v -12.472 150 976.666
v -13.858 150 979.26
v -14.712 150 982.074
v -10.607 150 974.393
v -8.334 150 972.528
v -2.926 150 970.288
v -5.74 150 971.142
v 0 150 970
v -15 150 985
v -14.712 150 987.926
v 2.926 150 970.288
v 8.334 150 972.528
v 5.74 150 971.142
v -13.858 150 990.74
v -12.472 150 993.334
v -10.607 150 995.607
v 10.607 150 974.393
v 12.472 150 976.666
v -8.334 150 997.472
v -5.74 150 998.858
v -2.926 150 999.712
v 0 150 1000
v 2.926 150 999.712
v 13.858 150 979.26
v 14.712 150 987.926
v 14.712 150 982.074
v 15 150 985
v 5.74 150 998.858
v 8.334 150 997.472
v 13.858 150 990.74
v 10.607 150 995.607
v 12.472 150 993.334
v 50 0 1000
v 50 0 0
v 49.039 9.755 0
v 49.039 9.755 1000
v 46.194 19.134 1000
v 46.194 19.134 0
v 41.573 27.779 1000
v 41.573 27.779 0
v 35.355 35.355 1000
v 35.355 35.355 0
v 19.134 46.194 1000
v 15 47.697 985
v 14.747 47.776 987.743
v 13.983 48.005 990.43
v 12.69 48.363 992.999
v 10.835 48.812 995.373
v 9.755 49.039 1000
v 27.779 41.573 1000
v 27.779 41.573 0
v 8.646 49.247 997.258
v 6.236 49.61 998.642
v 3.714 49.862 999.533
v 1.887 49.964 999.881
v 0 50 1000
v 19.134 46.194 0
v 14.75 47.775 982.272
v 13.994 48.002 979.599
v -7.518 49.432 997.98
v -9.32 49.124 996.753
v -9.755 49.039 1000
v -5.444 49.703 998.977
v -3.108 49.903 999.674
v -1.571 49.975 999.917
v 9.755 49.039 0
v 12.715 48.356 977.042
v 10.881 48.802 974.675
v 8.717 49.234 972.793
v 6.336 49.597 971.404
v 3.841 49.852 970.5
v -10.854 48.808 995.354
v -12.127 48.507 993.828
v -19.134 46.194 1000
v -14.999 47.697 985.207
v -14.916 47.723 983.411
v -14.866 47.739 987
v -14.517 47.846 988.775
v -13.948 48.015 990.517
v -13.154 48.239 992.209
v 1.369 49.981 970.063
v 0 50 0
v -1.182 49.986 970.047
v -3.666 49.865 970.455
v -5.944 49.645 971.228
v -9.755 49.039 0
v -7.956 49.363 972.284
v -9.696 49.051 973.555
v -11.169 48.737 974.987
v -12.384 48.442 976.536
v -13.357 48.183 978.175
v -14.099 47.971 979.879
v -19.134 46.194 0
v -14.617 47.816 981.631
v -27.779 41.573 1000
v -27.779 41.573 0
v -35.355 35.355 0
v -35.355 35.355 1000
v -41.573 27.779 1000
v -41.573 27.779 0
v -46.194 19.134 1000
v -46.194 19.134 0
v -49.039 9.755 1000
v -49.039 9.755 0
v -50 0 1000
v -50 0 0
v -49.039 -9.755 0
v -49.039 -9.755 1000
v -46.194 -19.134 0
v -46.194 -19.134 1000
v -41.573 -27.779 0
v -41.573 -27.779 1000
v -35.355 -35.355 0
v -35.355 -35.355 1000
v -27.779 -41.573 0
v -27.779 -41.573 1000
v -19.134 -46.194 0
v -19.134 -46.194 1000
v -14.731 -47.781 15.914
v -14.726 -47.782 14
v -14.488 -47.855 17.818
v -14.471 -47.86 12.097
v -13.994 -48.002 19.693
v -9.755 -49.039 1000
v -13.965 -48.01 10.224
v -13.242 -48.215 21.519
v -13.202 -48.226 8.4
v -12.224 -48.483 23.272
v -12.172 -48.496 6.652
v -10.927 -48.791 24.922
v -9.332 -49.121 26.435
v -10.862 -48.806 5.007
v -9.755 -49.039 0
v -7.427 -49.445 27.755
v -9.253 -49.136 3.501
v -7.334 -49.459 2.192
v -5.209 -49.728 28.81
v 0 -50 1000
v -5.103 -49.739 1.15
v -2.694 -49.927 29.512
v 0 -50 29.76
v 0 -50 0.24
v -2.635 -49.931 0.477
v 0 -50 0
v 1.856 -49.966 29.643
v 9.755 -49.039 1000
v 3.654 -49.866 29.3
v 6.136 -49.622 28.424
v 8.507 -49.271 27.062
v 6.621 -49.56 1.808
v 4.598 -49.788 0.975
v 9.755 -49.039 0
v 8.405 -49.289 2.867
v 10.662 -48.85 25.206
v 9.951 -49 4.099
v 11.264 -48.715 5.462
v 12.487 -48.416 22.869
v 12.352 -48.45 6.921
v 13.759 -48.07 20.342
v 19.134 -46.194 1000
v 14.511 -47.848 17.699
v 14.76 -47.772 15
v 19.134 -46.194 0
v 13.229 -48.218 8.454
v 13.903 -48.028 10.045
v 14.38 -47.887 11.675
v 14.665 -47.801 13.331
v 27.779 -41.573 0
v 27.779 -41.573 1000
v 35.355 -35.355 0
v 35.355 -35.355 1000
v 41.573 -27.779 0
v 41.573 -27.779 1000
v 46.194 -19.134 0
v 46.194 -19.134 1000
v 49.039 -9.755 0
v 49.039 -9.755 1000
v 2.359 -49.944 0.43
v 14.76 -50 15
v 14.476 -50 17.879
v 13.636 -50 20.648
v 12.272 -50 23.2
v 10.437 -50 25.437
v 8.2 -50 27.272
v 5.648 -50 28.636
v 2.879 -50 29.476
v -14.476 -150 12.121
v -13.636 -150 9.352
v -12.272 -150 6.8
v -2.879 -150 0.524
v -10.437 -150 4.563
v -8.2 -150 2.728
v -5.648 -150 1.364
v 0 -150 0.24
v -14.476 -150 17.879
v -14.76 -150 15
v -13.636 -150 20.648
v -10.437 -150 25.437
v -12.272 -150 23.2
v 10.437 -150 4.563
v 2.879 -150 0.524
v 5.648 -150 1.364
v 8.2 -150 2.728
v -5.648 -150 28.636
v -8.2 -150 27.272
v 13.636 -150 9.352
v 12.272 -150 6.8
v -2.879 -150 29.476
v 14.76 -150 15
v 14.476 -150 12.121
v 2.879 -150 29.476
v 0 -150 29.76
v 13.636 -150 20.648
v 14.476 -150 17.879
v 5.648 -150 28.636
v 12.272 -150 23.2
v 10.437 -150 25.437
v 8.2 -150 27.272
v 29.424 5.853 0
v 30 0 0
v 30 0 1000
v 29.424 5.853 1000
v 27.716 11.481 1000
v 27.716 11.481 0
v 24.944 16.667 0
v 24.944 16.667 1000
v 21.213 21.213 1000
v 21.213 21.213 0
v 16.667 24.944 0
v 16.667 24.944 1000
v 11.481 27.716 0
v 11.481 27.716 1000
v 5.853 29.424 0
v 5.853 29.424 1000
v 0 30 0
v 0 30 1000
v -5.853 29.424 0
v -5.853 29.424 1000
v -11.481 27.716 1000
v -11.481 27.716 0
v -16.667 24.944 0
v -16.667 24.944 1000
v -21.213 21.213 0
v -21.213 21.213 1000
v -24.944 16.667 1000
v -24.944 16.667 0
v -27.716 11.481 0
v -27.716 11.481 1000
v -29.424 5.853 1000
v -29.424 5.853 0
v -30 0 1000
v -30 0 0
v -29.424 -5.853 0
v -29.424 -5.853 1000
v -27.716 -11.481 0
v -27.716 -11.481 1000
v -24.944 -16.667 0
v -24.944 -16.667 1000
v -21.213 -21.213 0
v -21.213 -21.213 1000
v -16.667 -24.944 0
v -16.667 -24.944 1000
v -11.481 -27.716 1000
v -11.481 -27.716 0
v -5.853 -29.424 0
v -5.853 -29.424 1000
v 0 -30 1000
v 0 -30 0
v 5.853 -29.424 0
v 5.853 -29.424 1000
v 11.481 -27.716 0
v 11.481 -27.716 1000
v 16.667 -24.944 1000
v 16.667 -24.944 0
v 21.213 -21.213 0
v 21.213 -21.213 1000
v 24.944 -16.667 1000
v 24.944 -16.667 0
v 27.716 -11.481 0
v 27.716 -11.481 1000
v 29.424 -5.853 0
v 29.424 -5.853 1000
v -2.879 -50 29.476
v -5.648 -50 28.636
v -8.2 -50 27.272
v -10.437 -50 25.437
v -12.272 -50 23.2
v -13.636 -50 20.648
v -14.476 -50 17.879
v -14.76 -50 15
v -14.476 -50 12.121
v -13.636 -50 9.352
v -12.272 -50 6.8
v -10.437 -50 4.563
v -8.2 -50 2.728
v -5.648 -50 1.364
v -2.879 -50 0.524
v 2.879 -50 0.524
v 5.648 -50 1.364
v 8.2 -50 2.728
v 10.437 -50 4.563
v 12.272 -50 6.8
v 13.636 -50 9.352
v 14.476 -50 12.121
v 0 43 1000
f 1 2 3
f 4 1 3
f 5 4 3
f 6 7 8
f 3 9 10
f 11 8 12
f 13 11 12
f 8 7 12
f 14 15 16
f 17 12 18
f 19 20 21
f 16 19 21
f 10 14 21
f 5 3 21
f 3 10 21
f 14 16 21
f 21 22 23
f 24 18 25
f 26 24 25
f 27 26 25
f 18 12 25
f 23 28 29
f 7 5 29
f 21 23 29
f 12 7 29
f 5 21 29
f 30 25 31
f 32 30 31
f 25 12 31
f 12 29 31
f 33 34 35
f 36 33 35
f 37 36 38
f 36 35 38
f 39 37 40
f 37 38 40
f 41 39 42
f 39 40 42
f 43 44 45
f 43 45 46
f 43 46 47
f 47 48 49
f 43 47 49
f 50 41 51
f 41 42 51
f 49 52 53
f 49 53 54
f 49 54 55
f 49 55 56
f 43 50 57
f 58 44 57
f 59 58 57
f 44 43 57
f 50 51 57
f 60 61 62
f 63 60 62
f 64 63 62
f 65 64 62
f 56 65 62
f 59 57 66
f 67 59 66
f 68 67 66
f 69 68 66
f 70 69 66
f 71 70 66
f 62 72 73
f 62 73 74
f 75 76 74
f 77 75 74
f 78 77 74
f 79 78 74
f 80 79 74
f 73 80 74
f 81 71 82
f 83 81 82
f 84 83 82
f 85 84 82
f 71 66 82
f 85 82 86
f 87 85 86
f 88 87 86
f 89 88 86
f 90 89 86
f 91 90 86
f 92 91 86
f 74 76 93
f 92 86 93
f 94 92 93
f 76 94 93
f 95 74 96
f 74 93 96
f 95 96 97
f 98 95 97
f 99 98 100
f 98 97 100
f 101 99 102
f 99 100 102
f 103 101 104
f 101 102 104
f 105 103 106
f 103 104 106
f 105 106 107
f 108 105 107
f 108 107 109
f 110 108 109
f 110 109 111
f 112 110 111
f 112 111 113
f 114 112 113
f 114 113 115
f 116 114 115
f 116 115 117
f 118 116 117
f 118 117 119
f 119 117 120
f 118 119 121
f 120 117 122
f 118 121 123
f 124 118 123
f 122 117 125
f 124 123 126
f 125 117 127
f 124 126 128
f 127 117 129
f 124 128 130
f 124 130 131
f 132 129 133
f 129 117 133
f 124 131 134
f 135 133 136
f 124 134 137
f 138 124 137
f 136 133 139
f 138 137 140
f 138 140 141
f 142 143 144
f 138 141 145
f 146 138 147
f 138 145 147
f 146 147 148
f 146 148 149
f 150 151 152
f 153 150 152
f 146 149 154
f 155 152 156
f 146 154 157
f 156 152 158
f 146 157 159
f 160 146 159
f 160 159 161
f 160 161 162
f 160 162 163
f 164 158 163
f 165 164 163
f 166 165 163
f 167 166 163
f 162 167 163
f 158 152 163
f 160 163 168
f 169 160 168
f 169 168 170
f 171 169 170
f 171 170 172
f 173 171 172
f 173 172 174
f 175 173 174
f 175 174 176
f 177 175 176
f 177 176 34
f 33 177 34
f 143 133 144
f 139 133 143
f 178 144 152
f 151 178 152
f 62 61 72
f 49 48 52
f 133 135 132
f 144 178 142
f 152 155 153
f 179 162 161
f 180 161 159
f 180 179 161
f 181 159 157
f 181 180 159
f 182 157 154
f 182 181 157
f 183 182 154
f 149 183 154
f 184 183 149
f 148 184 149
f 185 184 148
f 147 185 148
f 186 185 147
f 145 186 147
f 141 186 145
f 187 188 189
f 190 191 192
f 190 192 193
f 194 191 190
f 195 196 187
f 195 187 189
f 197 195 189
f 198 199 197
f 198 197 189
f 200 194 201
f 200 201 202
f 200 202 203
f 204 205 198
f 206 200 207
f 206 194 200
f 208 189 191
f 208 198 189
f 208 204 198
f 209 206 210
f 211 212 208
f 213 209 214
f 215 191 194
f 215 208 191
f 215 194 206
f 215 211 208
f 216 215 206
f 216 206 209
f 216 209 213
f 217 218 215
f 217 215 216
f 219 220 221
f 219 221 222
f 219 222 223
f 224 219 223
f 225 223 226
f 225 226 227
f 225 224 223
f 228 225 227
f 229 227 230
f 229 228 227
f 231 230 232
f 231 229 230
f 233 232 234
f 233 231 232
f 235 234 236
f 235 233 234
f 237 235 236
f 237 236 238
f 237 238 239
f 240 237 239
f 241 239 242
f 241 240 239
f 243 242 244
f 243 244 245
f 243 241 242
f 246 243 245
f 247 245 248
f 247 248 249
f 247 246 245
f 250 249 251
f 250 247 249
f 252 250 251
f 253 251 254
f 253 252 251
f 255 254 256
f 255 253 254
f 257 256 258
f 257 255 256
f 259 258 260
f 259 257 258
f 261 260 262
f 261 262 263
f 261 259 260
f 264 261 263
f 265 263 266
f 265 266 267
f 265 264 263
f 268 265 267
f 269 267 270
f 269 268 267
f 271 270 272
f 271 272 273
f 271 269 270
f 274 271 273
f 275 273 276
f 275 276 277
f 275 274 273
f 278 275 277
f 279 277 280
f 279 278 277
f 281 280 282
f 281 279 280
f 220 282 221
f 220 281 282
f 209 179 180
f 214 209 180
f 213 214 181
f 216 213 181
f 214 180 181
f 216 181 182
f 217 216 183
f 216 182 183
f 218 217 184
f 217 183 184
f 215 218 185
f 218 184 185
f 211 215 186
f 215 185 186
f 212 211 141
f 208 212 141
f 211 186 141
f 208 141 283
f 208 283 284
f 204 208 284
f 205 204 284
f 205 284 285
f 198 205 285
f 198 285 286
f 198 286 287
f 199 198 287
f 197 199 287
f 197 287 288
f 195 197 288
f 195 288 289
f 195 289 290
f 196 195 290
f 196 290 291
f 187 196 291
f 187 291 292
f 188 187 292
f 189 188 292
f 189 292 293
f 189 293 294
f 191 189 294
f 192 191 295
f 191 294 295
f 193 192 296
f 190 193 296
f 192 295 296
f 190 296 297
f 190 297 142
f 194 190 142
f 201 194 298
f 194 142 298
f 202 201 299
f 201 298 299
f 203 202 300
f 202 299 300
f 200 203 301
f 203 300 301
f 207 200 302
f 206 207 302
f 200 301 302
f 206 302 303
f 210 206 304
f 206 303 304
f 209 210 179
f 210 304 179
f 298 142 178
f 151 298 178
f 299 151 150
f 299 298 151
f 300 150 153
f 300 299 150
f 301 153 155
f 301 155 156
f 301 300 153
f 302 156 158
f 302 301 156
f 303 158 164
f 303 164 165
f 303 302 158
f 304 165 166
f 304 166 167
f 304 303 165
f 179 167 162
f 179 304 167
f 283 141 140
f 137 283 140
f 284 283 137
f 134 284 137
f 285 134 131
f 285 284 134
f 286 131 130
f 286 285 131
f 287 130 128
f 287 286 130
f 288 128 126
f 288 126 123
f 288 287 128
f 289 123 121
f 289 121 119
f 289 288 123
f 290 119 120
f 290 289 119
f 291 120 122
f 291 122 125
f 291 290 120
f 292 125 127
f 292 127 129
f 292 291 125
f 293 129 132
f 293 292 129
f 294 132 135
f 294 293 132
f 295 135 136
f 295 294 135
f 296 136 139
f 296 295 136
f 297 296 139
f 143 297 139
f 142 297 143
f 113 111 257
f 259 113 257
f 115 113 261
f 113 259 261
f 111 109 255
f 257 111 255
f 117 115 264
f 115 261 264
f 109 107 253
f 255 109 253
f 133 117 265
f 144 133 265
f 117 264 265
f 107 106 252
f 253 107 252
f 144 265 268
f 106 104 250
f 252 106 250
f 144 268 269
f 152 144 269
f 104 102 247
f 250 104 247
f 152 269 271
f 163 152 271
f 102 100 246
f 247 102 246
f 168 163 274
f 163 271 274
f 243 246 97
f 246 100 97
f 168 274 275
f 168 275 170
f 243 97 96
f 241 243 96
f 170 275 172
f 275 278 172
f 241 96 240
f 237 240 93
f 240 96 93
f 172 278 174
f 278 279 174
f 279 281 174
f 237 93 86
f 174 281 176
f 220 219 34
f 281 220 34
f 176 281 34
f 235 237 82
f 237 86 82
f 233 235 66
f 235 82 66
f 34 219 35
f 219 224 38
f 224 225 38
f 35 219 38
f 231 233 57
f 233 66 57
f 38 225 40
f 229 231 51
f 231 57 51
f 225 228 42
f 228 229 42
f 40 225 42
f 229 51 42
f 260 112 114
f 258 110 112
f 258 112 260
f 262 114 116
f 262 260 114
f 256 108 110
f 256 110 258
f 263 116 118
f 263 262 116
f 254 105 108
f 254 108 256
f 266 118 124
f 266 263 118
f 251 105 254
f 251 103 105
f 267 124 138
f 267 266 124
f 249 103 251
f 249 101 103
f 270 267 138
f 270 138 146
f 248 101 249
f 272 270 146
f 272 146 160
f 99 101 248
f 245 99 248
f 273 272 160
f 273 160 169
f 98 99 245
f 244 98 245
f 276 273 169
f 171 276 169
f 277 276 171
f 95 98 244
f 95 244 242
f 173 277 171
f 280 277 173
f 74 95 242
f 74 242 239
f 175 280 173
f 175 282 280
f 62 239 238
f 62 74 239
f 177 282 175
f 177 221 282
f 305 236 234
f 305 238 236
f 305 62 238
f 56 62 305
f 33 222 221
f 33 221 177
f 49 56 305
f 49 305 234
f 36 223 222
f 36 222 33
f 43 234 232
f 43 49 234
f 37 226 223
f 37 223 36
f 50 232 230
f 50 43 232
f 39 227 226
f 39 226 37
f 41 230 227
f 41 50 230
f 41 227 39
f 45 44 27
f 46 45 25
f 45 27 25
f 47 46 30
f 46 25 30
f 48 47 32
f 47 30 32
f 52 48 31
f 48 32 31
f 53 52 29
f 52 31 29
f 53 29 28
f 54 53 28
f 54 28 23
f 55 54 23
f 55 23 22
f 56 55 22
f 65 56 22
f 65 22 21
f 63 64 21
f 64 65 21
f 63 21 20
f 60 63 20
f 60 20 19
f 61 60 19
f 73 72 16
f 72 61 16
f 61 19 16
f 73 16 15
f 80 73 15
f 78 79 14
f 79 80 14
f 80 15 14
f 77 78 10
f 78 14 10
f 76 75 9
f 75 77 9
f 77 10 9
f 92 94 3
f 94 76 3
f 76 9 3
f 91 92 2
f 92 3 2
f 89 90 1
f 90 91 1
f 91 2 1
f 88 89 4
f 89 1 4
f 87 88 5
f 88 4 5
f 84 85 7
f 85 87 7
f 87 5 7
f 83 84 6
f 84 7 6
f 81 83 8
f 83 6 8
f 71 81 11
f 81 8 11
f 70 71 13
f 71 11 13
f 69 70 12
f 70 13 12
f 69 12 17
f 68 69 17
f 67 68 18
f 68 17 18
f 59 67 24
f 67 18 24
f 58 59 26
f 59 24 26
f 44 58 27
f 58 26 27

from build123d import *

# Parameters (mm, degrees)
F0_R          = 50
F0_R_2        = 30
F1_DEPTH      = 1000
F3_R          = 14.7596932235
F4_DEPTH      = 100
F4_DEPTH_BACK = 7
F6_R          = 15
F7_DEPTH      = 100
F7_DEPTH_BACK = 7


with BuildPart() as f1:
    # F0 (on Top) → F1 (new body)
    with BuildSketch(Plane.XY):
        Circle(F0_R)
        Circle(F0_R_2, mode=Mode.SUBTRACT)
    extrude(amount=F1_DEPTH)

    # F3 (on offset) → F4 (join, two sides)
    with BuildSketch(Plane.XZ.offset(50)) as f4_sk:
        with Locations((0, 15)):
            Circle(F3_R)
    extrude(amount=F4_DEPTH)
    extrude(f4_sk.sketch, amount=-F4_DEPTH_BACK)

    # F6 (on offset) → F7 (join, two sides)
    with BuildSketch(Plane.XZ.offset(-50)) as f7_sk:
        with Locations((0, 985)):
            Circle(F6_R)
    extrude(amount=-F7_DEPTH)
    extrude(f7_sk.sketch, amount=F7_DEPTH_BACK)


solid = f1.part
